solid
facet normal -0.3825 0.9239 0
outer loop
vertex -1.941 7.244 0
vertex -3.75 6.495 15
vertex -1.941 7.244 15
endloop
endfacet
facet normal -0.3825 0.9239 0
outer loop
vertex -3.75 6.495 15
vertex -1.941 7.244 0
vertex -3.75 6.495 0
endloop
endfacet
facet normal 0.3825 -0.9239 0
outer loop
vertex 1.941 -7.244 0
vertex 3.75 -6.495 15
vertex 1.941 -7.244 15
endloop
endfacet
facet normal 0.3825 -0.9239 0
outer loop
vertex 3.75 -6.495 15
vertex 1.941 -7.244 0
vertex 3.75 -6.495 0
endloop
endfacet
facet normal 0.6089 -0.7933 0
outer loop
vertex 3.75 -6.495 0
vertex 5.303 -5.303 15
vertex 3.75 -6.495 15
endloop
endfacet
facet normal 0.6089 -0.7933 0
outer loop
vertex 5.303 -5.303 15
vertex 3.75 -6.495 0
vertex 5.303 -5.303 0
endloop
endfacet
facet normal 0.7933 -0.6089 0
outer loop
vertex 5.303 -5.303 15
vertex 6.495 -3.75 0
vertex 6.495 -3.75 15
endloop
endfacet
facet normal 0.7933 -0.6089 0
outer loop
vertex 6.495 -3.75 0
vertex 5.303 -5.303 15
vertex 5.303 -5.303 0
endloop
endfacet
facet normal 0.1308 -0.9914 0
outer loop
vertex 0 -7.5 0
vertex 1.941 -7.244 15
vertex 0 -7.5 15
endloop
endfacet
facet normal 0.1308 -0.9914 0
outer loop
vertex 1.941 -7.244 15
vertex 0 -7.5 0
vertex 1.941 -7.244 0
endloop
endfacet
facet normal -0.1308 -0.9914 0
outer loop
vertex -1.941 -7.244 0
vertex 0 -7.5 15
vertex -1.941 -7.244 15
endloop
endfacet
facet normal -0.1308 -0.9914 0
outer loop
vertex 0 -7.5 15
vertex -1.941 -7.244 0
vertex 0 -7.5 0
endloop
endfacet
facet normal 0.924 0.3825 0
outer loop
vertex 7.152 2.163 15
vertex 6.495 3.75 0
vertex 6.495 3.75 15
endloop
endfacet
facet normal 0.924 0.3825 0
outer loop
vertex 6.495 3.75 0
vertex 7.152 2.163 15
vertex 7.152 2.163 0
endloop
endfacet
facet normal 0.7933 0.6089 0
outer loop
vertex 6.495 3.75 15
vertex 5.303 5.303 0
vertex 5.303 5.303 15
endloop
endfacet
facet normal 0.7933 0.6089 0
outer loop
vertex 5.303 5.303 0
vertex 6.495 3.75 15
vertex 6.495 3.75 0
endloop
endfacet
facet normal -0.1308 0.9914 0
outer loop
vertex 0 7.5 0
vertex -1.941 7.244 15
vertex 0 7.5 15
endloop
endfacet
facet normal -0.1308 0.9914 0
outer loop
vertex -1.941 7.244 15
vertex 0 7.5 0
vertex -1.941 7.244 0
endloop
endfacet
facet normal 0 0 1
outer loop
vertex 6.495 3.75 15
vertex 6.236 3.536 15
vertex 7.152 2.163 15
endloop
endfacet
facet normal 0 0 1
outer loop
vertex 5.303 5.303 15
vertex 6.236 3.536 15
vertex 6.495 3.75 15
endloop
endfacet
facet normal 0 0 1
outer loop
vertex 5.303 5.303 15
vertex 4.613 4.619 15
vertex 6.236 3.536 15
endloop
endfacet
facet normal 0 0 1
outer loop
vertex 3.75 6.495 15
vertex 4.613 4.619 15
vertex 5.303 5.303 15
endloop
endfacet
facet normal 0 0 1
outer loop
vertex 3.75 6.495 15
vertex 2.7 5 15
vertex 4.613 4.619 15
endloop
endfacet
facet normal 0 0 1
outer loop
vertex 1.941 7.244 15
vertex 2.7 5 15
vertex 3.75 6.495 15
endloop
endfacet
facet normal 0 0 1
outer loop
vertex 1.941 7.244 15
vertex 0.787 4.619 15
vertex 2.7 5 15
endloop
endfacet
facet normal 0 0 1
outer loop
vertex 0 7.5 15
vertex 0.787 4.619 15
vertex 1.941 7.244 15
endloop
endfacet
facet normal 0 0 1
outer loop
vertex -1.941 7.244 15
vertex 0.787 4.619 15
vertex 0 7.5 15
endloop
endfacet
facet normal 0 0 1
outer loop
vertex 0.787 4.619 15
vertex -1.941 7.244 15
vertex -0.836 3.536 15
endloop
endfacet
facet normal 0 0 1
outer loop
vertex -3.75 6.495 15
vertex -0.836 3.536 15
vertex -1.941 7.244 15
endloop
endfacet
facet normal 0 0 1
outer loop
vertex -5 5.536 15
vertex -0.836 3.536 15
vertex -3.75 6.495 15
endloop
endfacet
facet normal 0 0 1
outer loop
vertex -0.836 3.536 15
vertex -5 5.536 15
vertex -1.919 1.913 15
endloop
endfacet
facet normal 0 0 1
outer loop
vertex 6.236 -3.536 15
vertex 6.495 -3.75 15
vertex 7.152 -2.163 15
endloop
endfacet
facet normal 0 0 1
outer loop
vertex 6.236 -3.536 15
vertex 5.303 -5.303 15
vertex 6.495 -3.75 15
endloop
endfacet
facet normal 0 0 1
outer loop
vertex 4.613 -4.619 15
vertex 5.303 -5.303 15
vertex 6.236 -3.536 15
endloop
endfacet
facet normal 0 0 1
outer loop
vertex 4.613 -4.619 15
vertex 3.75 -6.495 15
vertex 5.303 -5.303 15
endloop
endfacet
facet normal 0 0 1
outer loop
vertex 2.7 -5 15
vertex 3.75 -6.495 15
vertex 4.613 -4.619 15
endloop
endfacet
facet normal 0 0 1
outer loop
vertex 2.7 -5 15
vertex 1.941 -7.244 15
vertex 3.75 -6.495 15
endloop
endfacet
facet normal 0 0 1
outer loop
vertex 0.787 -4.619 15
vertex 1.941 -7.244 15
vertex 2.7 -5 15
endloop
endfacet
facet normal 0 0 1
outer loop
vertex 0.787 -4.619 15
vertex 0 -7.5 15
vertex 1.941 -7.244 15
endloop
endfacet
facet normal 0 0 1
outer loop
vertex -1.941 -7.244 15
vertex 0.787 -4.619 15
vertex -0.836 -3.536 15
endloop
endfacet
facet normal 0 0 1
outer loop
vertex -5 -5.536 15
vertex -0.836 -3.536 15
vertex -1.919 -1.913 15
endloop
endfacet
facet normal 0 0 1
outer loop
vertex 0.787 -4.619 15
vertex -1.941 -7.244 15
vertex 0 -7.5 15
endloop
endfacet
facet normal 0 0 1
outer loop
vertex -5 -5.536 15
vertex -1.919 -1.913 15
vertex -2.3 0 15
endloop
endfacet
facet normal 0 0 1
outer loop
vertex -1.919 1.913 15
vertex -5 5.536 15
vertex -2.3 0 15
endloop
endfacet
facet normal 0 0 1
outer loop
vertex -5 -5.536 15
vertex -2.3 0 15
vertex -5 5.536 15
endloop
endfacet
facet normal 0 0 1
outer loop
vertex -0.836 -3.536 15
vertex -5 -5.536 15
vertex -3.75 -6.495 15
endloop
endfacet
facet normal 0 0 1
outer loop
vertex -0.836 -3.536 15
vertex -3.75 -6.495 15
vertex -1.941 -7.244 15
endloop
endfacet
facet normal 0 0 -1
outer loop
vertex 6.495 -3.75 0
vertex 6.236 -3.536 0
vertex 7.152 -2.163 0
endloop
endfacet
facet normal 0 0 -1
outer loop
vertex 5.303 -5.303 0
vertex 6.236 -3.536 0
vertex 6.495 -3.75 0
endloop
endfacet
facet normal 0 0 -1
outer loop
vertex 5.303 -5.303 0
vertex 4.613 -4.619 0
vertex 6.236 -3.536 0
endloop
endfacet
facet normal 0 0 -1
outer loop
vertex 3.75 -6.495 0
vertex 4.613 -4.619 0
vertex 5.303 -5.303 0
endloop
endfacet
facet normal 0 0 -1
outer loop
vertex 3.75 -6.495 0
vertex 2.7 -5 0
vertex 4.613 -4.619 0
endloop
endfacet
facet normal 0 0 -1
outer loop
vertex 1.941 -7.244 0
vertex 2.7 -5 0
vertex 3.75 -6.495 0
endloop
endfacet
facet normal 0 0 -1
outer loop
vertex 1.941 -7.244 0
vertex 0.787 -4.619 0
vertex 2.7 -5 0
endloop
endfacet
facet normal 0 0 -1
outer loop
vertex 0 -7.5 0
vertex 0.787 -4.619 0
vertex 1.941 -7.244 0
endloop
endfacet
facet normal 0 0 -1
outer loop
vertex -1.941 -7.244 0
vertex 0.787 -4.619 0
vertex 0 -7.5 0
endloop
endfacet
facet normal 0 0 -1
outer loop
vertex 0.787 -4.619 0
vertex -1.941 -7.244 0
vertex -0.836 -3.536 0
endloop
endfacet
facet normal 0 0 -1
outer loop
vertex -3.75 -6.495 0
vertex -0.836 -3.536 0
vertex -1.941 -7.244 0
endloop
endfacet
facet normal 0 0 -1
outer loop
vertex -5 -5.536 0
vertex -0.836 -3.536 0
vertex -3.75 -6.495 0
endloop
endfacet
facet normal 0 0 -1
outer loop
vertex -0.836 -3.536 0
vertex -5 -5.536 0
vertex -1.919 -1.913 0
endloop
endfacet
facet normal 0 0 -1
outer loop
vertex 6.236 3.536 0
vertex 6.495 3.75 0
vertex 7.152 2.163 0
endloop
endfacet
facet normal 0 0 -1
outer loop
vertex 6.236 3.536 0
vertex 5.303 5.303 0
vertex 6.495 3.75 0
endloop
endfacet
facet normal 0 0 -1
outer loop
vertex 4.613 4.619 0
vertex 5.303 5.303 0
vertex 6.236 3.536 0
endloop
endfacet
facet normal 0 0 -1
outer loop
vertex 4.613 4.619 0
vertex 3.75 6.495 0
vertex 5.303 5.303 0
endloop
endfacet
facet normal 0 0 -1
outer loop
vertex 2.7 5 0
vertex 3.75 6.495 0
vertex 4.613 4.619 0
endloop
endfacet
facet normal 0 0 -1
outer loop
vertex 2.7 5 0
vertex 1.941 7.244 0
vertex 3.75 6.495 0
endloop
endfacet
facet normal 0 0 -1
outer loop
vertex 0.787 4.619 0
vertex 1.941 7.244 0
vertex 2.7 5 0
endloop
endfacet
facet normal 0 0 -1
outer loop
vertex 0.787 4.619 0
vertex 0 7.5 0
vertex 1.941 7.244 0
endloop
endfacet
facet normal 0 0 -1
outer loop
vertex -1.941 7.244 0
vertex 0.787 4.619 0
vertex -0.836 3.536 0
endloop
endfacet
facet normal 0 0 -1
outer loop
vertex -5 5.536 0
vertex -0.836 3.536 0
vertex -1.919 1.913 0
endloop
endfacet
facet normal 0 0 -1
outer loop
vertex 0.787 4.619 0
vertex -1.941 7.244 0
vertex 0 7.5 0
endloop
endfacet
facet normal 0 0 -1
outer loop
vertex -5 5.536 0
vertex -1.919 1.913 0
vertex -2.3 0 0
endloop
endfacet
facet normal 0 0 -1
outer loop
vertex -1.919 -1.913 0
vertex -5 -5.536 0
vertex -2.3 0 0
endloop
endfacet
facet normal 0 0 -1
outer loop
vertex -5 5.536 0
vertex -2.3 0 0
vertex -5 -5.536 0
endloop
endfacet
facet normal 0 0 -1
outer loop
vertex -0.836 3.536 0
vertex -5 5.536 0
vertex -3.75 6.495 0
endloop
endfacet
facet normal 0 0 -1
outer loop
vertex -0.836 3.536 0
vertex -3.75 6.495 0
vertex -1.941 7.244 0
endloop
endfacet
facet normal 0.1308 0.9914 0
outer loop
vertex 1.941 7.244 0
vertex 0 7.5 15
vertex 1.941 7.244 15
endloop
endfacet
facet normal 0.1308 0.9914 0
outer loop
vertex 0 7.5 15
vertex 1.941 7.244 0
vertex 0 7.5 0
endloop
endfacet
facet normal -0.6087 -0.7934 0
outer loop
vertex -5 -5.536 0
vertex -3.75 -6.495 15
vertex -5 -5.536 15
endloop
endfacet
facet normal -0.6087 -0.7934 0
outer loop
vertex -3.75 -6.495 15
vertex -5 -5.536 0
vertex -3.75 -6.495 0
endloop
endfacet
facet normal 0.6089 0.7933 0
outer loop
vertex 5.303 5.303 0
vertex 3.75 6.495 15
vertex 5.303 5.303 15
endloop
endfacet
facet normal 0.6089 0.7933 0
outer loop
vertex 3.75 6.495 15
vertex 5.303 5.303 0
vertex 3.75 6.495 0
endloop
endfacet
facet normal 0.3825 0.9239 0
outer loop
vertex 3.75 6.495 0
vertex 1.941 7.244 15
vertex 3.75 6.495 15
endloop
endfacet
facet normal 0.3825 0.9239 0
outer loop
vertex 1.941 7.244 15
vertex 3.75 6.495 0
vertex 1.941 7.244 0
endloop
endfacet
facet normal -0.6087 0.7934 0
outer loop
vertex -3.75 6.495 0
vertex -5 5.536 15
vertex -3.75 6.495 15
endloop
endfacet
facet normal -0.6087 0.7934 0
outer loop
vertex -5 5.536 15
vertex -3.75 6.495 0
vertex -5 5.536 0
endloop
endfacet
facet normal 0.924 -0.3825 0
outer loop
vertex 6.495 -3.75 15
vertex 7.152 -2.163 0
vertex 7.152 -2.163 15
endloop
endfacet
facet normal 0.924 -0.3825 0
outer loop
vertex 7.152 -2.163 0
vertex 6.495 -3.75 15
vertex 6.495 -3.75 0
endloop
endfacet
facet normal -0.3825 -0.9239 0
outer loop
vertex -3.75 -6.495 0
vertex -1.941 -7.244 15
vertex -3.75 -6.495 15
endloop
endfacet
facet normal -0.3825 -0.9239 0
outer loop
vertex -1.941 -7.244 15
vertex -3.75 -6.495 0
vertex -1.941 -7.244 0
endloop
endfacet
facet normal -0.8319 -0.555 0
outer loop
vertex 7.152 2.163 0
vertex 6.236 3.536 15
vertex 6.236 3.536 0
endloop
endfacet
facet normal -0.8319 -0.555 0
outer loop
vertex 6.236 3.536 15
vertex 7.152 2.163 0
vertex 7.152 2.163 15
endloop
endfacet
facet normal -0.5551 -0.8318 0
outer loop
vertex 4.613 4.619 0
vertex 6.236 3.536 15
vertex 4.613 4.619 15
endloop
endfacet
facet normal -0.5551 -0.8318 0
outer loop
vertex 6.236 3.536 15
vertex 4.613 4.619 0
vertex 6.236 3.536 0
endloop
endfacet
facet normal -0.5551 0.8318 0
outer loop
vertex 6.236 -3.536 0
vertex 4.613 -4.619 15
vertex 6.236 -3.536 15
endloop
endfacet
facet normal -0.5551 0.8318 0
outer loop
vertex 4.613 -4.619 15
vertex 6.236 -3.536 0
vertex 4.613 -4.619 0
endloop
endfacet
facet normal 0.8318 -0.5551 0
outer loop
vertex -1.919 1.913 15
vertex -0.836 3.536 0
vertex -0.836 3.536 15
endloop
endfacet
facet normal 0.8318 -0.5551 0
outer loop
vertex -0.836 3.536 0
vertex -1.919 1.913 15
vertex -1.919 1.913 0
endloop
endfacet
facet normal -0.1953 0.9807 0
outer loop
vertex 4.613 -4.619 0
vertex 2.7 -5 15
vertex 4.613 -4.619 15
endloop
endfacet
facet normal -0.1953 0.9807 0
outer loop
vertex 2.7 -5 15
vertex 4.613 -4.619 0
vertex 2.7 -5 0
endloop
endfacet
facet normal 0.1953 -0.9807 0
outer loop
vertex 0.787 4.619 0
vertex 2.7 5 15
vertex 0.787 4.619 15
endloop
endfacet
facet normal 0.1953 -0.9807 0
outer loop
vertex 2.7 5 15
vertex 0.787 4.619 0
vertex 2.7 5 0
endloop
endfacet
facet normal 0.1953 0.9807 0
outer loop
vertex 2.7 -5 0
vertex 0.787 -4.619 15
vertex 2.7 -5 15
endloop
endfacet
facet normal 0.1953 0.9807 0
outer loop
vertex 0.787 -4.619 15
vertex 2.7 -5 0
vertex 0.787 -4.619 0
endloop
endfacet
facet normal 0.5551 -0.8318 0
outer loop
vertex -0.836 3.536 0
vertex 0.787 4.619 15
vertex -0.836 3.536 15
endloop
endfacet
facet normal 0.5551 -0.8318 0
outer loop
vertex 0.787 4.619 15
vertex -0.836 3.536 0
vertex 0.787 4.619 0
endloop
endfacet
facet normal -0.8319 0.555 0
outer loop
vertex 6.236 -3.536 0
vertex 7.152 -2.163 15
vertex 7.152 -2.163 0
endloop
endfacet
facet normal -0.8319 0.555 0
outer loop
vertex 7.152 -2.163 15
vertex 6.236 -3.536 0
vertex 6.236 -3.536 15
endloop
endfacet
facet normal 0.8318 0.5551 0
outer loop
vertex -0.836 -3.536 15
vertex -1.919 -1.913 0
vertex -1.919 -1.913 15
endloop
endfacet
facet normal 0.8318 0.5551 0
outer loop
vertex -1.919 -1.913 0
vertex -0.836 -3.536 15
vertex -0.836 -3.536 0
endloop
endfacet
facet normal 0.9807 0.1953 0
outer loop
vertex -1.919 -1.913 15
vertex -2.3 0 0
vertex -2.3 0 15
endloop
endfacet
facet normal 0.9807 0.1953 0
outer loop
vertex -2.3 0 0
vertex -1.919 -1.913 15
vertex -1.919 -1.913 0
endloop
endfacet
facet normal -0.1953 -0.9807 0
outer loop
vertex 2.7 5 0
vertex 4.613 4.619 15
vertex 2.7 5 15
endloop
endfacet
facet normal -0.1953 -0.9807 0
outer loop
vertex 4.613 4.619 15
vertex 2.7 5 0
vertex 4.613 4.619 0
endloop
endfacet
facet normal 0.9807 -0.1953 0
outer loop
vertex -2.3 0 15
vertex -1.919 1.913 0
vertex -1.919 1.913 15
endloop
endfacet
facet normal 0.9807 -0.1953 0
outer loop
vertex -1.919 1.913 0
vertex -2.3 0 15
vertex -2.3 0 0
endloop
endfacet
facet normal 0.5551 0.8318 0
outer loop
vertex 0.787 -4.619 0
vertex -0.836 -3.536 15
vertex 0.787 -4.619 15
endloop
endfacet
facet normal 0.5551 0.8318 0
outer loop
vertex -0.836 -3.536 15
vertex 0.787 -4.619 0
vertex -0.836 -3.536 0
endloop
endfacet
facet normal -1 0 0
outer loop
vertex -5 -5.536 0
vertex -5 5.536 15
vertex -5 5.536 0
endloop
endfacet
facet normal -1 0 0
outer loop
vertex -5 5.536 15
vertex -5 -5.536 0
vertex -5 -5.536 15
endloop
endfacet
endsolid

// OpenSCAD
height = 15; //mm
hole = 10; //mm
thickness = 5; //mm

difference() {
    cylinder(
        h=height,
        d=hole+thickness);
    translate([2.7, 0, 0]){
        cylinder(
            h=height+1,
            d=hole);
    }
    translate([-26,-10,0]){
        cube(21);
    }   
}
